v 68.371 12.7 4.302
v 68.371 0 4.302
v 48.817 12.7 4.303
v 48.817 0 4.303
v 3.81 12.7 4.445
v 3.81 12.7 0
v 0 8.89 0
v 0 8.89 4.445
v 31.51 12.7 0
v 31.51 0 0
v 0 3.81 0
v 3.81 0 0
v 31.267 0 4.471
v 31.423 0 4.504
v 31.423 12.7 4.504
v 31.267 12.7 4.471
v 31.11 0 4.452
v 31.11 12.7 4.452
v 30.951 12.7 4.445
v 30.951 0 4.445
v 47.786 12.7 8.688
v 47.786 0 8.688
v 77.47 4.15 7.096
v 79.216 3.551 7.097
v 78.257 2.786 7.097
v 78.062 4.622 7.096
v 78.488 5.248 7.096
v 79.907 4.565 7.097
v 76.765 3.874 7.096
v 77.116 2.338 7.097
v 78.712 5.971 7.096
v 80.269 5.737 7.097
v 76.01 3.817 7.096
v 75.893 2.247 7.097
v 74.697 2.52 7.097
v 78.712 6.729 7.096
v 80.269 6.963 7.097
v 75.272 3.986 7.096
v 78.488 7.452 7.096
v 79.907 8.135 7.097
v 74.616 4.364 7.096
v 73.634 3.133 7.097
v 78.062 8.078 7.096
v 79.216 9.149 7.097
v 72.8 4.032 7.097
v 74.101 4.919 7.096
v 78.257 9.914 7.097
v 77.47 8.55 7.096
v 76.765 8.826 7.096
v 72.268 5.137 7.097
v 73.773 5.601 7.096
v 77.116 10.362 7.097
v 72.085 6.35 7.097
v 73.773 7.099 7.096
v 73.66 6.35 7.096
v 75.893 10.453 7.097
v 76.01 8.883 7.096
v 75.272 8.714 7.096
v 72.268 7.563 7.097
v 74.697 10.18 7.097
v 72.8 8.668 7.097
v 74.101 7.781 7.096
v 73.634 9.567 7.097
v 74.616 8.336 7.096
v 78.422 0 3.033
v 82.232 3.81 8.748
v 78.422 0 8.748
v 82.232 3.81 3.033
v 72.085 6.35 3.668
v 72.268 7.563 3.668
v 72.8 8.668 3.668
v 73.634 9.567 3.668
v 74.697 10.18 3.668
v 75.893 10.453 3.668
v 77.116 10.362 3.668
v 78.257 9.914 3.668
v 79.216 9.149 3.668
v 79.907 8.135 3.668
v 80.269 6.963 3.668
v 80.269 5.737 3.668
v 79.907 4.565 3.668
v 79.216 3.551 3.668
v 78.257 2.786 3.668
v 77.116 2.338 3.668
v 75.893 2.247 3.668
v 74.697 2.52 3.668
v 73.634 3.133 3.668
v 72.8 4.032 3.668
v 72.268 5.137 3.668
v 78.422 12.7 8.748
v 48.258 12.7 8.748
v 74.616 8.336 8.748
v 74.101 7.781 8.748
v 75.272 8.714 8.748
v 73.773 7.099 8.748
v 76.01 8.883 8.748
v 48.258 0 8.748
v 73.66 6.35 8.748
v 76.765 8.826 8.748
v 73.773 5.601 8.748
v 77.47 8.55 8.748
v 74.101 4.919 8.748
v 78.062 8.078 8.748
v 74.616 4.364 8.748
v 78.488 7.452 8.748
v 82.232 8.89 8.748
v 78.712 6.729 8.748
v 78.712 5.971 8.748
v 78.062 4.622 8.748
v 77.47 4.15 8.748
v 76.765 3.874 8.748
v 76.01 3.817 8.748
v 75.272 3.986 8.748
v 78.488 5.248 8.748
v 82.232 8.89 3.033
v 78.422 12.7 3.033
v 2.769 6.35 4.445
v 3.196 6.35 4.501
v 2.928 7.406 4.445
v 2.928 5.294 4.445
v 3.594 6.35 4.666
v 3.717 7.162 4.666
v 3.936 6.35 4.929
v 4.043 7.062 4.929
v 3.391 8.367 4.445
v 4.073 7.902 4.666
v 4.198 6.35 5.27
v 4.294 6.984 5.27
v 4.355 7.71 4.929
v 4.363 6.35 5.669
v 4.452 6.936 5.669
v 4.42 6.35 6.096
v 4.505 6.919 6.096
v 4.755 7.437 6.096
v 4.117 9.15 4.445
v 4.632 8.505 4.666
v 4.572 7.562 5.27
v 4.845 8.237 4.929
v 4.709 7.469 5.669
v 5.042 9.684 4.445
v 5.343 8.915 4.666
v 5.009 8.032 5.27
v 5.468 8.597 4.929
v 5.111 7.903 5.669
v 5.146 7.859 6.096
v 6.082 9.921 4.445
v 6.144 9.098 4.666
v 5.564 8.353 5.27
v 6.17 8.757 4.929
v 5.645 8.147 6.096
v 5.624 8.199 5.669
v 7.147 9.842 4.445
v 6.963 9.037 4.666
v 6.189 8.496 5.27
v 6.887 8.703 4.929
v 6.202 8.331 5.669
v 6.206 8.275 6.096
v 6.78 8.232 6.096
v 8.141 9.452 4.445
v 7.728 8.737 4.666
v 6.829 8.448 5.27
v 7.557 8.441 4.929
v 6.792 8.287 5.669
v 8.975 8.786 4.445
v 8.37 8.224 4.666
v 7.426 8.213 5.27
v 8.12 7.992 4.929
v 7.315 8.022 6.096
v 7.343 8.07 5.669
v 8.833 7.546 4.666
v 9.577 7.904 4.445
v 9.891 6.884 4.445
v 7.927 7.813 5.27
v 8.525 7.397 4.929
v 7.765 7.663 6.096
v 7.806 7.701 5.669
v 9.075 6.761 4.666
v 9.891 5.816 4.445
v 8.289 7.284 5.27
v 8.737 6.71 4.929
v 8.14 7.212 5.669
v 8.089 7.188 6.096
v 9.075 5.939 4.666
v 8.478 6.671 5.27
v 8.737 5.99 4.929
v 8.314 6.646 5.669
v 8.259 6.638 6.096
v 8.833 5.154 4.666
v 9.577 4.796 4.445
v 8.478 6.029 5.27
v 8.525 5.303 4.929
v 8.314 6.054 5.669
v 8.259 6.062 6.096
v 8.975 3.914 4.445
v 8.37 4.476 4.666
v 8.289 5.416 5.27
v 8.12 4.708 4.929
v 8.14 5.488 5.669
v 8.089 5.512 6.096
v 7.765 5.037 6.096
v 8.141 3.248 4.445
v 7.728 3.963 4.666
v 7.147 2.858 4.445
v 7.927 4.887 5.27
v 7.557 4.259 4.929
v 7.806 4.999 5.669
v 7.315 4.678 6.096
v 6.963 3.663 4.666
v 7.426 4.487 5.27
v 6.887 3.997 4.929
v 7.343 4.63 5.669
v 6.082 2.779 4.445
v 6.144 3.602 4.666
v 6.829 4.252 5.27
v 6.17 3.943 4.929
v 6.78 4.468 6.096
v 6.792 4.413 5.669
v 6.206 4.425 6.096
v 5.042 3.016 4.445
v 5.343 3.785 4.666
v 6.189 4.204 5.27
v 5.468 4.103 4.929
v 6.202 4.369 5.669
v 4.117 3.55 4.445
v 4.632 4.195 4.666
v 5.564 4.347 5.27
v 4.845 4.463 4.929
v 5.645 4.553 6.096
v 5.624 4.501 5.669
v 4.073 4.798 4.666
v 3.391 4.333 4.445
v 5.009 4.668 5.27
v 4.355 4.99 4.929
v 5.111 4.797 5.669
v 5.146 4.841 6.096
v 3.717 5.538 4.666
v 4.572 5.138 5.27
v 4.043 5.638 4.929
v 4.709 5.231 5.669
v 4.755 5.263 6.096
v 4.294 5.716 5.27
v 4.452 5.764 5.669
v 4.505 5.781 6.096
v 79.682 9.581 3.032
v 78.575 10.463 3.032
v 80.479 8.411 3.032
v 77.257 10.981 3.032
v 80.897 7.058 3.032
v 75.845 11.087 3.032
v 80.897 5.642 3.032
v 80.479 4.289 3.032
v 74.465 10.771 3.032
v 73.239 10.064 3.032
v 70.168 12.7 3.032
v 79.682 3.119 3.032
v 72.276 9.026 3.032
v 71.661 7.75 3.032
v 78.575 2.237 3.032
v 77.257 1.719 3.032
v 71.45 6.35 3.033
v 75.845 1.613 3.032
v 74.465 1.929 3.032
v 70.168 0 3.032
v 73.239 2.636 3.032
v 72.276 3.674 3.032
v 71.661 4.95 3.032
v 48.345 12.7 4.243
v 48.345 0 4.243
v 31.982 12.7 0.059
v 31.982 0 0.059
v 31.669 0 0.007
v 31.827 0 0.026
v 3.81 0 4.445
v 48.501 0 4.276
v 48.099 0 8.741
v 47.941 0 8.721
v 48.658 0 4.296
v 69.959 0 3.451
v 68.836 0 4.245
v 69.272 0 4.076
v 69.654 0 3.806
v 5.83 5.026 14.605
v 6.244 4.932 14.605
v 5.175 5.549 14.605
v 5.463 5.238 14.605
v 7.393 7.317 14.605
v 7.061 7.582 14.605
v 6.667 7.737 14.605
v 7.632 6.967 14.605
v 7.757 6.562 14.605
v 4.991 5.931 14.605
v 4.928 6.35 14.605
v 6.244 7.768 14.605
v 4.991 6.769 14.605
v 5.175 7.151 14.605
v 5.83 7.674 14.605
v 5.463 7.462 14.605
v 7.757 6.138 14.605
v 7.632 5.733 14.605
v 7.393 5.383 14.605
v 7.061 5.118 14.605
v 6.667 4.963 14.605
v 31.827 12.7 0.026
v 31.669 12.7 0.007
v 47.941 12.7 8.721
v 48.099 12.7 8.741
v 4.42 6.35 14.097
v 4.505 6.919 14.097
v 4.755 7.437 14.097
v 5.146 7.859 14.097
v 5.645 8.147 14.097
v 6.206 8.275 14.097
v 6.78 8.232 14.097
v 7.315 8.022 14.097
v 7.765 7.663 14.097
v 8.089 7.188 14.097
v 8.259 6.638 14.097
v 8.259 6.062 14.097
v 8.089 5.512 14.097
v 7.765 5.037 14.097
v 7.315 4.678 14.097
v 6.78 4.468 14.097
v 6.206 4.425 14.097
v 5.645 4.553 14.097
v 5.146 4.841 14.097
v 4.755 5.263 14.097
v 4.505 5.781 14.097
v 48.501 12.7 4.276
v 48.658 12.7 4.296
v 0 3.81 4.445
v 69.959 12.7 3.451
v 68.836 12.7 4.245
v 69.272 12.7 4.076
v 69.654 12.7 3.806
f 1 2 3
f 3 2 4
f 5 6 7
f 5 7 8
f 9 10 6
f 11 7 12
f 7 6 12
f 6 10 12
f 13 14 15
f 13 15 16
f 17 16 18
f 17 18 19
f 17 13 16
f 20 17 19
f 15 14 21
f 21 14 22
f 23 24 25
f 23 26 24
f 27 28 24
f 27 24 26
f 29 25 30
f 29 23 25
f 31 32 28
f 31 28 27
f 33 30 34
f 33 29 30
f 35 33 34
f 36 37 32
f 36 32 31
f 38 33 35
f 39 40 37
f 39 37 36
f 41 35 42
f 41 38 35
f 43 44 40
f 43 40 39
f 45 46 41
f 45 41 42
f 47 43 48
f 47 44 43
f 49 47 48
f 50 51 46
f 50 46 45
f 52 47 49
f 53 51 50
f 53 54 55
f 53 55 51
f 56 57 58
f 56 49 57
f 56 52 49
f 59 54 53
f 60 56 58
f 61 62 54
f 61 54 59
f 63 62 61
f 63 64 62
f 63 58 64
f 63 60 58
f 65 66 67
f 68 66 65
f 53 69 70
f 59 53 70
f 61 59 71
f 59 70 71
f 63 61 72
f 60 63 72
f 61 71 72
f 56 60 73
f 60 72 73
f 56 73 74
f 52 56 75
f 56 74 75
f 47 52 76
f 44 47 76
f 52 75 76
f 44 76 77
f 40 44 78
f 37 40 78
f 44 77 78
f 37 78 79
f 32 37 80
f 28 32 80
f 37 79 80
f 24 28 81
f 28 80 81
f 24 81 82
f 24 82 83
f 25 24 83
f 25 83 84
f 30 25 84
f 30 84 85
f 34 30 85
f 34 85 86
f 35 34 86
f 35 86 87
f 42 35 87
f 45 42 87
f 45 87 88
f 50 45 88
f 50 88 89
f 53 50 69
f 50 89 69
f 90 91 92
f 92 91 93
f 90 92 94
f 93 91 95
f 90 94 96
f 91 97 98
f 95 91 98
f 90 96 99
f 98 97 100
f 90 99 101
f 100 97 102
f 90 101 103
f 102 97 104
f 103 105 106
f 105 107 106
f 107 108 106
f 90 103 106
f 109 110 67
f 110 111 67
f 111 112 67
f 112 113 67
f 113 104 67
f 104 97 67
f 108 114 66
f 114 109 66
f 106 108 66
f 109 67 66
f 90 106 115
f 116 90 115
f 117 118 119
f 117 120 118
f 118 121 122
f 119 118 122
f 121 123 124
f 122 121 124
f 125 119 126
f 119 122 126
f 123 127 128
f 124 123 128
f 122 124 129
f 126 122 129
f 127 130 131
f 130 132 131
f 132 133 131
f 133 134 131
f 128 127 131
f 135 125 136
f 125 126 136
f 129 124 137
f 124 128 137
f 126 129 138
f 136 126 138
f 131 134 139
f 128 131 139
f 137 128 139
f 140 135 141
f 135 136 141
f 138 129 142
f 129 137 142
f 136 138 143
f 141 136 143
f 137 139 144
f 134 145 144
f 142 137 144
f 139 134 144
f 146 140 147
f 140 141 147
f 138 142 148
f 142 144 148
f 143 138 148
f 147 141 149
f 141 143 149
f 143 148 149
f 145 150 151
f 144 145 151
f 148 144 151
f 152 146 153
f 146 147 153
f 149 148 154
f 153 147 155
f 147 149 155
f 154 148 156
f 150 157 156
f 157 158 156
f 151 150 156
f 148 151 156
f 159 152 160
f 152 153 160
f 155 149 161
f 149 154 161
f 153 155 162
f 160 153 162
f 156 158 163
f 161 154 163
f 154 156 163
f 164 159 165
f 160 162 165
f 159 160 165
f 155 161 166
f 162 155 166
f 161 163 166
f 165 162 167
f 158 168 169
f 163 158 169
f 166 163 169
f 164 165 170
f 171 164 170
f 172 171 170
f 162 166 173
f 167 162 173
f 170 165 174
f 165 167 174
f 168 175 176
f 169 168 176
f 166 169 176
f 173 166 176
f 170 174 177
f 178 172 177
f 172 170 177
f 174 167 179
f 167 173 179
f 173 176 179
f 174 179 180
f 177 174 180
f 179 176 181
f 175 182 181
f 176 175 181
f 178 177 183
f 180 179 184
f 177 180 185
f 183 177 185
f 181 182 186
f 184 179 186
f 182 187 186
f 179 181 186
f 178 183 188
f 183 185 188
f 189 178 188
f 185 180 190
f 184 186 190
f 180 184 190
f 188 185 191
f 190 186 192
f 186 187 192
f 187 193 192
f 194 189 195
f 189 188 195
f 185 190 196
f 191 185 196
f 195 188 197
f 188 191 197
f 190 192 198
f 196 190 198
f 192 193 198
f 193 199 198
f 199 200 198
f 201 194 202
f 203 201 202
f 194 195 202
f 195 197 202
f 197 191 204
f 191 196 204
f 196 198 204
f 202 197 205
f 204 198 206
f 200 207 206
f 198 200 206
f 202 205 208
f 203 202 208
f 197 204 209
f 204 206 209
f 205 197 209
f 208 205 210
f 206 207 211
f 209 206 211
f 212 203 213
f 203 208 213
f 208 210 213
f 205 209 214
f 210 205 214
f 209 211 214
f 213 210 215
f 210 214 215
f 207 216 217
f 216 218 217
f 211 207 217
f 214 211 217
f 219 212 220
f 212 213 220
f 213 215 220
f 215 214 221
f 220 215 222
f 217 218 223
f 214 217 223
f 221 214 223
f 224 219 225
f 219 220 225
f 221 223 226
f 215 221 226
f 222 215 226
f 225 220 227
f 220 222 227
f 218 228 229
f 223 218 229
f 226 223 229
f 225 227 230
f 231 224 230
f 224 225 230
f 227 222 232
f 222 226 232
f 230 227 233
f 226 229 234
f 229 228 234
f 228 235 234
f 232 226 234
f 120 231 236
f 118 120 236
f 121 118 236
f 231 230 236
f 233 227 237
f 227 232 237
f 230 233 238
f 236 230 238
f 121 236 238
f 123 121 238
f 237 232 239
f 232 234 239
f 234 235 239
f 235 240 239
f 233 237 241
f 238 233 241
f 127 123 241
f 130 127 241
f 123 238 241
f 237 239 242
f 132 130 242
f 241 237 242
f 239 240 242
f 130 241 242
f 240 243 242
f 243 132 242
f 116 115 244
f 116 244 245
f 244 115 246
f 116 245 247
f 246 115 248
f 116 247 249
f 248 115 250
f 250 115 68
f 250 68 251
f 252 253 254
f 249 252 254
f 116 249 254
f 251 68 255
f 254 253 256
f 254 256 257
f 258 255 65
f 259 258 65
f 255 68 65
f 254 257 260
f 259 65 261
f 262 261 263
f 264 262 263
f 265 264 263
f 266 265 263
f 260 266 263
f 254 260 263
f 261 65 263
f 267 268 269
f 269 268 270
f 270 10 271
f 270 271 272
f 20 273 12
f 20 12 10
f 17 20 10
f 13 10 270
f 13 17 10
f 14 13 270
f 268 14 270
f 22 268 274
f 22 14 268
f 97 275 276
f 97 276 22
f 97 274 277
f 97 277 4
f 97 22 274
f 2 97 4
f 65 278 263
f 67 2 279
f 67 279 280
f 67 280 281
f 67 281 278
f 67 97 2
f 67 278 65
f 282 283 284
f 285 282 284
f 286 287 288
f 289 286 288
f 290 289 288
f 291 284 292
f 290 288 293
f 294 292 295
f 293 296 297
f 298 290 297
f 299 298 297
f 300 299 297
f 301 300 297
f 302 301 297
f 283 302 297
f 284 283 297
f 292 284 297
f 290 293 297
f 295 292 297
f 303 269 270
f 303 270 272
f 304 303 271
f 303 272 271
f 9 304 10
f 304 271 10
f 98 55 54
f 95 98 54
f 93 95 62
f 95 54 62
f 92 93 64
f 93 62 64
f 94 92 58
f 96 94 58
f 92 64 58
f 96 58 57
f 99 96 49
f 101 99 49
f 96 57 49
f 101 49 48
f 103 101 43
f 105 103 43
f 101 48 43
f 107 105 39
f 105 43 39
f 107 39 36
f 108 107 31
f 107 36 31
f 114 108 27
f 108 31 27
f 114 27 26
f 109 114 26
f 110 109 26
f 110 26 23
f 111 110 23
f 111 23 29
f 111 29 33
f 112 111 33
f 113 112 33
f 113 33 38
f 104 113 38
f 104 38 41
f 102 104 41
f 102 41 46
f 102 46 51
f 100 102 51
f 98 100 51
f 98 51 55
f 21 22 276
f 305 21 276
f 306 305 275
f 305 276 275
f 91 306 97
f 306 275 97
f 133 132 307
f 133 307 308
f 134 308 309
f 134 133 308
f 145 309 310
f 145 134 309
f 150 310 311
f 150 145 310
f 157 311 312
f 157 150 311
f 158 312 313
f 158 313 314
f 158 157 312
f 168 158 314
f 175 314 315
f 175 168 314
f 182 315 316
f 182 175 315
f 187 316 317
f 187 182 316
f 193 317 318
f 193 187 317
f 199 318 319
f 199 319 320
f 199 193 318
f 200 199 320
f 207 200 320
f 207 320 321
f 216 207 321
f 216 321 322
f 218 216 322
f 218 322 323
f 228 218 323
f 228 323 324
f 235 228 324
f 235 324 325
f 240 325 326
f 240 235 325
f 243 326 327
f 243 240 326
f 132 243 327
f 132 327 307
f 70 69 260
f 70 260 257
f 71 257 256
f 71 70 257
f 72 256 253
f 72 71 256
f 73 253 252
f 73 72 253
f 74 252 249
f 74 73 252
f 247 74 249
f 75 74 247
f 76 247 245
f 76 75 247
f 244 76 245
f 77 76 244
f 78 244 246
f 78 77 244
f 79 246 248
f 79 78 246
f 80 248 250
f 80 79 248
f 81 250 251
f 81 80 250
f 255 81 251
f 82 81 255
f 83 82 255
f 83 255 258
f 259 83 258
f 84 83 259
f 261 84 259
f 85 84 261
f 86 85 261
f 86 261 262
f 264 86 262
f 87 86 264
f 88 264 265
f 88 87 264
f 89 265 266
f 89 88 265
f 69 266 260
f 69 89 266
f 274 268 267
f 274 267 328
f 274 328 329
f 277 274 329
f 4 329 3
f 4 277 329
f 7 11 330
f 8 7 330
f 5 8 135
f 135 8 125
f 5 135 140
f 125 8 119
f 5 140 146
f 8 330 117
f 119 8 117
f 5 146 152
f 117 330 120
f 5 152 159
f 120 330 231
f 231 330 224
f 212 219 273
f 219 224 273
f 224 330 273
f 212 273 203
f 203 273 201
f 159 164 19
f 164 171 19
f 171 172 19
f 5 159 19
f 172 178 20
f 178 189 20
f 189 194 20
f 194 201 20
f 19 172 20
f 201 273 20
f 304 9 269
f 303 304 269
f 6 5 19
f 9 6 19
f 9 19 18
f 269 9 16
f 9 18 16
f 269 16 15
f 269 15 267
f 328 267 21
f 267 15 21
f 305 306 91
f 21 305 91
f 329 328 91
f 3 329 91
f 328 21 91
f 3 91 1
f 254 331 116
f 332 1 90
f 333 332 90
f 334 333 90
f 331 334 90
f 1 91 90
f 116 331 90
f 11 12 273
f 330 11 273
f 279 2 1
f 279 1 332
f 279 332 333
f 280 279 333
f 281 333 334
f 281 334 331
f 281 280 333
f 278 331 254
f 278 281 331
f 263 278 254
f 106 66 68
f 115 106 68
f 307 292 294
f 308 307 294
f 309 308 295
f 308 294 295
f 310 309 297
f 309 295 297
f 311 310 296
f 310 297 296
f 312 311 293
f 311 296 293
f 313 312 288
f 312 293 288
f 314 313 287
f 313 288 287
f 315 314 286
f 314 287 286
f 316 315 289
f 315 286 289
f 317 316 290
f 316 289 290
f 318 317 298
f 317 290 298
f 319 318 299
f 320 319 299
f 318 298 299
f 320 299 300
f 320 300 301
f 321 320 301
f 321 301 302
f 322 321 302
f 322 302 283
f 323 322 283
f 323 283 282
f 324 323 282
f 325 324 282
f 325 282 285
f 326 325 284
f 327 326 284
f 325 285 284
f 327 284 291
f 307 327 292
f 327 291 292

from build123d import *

# Parameters (mm, degrees)
BOSS_EXTRUDE1_DEPTH = 12.7
SKETCH2_R           = 4.1148
CUT_EXTRUDE1_DEPTH  = 4.064
SKETCH3_R           = 2.54
CUT_EXTRUDE2_DEPTH  = 84.509486698
SKETCH4_R           = 1.9304
BOSS_EXTRUDE2_DEPTH = 10.16
FILLET1_R           = 1.651
CHAMFER1_SIZE       = 3.81
FILLET2_R           = 1.905
CHAMFER2_SIZE       = 0.635
CHAMFER3_SIZE       = 0.508


with BuildPart() as part:
    # Sketch1 → Boss-Extrude1 (new body)
    with BuildSketch(Plane(origin=(0, 0, 0), x_dir=(1, 0, 0), z_dir=(0, 1, 0))):
        Polygon((0, 0), (0, -4.445), (31.190740793, -4.445), (48.018240793, -8.7475), (82.2325, -8.7475), (82.2325, -3.0325), (70.1675, -3.0325), (70.1675, -4.3025), (48.5775, -4.3025), (31.75, 0), align=None)
    extrude(amount=BOSS_EXTRUDE1_DEPTH)

    # Sketch2 → Cut-Extrude1 (cut)
    with BuildSketch(Plane(origin=(0, 0, 3.0325), x_dir=(-1, 0, 0), z_dir=(0, 0, -1))):
        with Locations((-76.2, 6.35)):
            Circle(SKETCH2_R)
    extrude(amount=-CUT_EXTRUDE1_DEPTH, mode=Mode.SUBTRACT)

    # Sketch3 → Cut-Extrude2 (cut, through all)
    with BuildSketch(Plane(origin=(0, 0, 7.0965), x_dir=(-1, 0, 0), z_dir=(0, 0, -1))):
        with Locations((-76.2, 6.35)):
            Circle(SKETCH3_R)
    extrude(amount=-CUT_EXTRUDE2_DEPTH, mode=Mode.SUBTRACT)

    # Sketch4 → Boss-Extrude2 (add)
    with BuildSketch(Plane(origin=(0, 0, 4.445), x_dir=(-1, 0, 0), z_dir=(0, 0, -1))):
        with Locations((-6.35, 6.35)):
            Circle(SKETCH4_R)
    extrude(amount=-BOSS_EXTRUDE2_DEPTH)

    # Fillet1
    fillet1_edges = [part.edges().sort_by_distance(p)[0] for p in [
        (8.2804, 6.35, 4.445),
    ]]
    fillet(fillet1_edges, radius=FILLET1_R)

    # Chamfer1
    chamfer1_edges = [part.edges().sort_by_distance(p)[0] for p in [
        (82.2325, 0, 5.89),
        (0, 0, 2.2225),
        (82.2325, 12.7, 5.89),
        (0, 12.7, 2.2225),
    ]]
    chamfer(chamfer1_edges, length=CHAMFER1_SIZE)

    # Fillet2
    # the kernel refuses this fillet: 1.905 mm, written as the material it adds along each edge
    with BuildSketch(Plane(origin=(31.190740793, 0, 4.445), x_dir=(-1, 0, 0), z_dir=(0, 1, 0))) as fillet2_piece_1:
        with BuildLine():
            CenterArc((FILLET2_R * 0.125817594312, FILLET2_R), FILLET2_R, 255.657728572, 14.342271428)
            Line((-FILLET2_R * 0.121896267277, FILLET2_R * 0.0311667621428), (0, 0))
            Line((0, 0), (FILLET2_R * 0.125817594312, 0))
        make_face()
    extrude(amount=12.7)
    with BuildSketch(Plane(origin=(48.5775, 0, 4.3025), x_dir=(-0.96883323785722, 0, -0.24771386158851796), z_dir=(0, 1, 0))) as fillet2_piece_2:
        with BuildLine():
            CenterArc((FILLET2_R * 0.125817594312, -FILLET2_R), FILLET2_R, 90, 14.342271428)
            Line((-FILLET2_R * 0.121896267277, -FILLET2_R * 0.0311667621428), (0, 0))
            Line((0, 0), (FILLET2_R * 0.125817594312, 0))
        make_face()
    extrude(amount=12.7)
    with BuildSketch(Plane(origin=(70.1675, 0, 4.3025), x_dir=(-1, 0, 0), z_dir=(0, 1, 0))) as fillet2_piece_3:
        with BuildLine():
            CenterArc((1.796051224, -1.905), FILLET2_R, 90, 70.528779366)
            Line((0, -1.27), (0, 0))
            Line((0, 0), (1.796051224, 0))
        make_face()
    extrude(amount=12.7)
    # the kernel refuses this fillet: 1.905 mm, written as the material it takes off along each edge
    with BuildSketch(Plane(origin=(48.018240793, -0.599206293, 8.7475), x_dir=(-0.96883323785722, 0, -0.24771386158851796), z_dir=(0, 1, 0))) as fillet2_2_piece_1:
        with BuildLine():
            CenterArc((FILLET2_R * 0.125817594312, -FILLET2_R), FILLET2_R, 90, 14.342271428)
            Line((-FILLET2_R * 0.121896267277, -FILLET2_R * 0.0311667621428), (0, 0))
            Line((0, 0), (FILLET2_R * 0.125817594312, 0))
        make_face()
    extrude(amount=13.898412586, mode=Mode.SUBTRACT)
    with BuildSketch(Plane(origin=(31.75, -0.599206293, 0), x_dir=(-1, 0, 0), z_dir=(0, 1, 0))) as fillet2_2_piece_2:
        with BuildLine():
            CenterArc((FILLET2_R * 0.125817594312, FILLET2_R), FILLET2_R, 255.657728572, 14.342271428)
            Line((-FILLET2_R * 0.121896267277, FILLET2_R * 0.0311667621428), (0, 0))
            Line((0, 0), (FILLET2_R * 0.125817594312, 0))
        make_face()
    extrude(amount=13.898412586, mode=Mode.SUBTRACT)

    # Chamfer2
    chamfer2_edges = [part.edges().sort_by_distance(p)[0] for p in [
        (80.3148, 6.35, 3.0325),
    ]]
    chamfer(chamfer2_edges, length=CHAMFER2_SIZE)

    # Chamfer3
    chamfer3_edges = [part.edges().sort_by_distance(p)[0] for p in [
        (8.2804, 6.35, 14.605),
    ]]
    chamfer(chamfer3_edges, length=CHAMFER3_SIZE)


solid = part.part
